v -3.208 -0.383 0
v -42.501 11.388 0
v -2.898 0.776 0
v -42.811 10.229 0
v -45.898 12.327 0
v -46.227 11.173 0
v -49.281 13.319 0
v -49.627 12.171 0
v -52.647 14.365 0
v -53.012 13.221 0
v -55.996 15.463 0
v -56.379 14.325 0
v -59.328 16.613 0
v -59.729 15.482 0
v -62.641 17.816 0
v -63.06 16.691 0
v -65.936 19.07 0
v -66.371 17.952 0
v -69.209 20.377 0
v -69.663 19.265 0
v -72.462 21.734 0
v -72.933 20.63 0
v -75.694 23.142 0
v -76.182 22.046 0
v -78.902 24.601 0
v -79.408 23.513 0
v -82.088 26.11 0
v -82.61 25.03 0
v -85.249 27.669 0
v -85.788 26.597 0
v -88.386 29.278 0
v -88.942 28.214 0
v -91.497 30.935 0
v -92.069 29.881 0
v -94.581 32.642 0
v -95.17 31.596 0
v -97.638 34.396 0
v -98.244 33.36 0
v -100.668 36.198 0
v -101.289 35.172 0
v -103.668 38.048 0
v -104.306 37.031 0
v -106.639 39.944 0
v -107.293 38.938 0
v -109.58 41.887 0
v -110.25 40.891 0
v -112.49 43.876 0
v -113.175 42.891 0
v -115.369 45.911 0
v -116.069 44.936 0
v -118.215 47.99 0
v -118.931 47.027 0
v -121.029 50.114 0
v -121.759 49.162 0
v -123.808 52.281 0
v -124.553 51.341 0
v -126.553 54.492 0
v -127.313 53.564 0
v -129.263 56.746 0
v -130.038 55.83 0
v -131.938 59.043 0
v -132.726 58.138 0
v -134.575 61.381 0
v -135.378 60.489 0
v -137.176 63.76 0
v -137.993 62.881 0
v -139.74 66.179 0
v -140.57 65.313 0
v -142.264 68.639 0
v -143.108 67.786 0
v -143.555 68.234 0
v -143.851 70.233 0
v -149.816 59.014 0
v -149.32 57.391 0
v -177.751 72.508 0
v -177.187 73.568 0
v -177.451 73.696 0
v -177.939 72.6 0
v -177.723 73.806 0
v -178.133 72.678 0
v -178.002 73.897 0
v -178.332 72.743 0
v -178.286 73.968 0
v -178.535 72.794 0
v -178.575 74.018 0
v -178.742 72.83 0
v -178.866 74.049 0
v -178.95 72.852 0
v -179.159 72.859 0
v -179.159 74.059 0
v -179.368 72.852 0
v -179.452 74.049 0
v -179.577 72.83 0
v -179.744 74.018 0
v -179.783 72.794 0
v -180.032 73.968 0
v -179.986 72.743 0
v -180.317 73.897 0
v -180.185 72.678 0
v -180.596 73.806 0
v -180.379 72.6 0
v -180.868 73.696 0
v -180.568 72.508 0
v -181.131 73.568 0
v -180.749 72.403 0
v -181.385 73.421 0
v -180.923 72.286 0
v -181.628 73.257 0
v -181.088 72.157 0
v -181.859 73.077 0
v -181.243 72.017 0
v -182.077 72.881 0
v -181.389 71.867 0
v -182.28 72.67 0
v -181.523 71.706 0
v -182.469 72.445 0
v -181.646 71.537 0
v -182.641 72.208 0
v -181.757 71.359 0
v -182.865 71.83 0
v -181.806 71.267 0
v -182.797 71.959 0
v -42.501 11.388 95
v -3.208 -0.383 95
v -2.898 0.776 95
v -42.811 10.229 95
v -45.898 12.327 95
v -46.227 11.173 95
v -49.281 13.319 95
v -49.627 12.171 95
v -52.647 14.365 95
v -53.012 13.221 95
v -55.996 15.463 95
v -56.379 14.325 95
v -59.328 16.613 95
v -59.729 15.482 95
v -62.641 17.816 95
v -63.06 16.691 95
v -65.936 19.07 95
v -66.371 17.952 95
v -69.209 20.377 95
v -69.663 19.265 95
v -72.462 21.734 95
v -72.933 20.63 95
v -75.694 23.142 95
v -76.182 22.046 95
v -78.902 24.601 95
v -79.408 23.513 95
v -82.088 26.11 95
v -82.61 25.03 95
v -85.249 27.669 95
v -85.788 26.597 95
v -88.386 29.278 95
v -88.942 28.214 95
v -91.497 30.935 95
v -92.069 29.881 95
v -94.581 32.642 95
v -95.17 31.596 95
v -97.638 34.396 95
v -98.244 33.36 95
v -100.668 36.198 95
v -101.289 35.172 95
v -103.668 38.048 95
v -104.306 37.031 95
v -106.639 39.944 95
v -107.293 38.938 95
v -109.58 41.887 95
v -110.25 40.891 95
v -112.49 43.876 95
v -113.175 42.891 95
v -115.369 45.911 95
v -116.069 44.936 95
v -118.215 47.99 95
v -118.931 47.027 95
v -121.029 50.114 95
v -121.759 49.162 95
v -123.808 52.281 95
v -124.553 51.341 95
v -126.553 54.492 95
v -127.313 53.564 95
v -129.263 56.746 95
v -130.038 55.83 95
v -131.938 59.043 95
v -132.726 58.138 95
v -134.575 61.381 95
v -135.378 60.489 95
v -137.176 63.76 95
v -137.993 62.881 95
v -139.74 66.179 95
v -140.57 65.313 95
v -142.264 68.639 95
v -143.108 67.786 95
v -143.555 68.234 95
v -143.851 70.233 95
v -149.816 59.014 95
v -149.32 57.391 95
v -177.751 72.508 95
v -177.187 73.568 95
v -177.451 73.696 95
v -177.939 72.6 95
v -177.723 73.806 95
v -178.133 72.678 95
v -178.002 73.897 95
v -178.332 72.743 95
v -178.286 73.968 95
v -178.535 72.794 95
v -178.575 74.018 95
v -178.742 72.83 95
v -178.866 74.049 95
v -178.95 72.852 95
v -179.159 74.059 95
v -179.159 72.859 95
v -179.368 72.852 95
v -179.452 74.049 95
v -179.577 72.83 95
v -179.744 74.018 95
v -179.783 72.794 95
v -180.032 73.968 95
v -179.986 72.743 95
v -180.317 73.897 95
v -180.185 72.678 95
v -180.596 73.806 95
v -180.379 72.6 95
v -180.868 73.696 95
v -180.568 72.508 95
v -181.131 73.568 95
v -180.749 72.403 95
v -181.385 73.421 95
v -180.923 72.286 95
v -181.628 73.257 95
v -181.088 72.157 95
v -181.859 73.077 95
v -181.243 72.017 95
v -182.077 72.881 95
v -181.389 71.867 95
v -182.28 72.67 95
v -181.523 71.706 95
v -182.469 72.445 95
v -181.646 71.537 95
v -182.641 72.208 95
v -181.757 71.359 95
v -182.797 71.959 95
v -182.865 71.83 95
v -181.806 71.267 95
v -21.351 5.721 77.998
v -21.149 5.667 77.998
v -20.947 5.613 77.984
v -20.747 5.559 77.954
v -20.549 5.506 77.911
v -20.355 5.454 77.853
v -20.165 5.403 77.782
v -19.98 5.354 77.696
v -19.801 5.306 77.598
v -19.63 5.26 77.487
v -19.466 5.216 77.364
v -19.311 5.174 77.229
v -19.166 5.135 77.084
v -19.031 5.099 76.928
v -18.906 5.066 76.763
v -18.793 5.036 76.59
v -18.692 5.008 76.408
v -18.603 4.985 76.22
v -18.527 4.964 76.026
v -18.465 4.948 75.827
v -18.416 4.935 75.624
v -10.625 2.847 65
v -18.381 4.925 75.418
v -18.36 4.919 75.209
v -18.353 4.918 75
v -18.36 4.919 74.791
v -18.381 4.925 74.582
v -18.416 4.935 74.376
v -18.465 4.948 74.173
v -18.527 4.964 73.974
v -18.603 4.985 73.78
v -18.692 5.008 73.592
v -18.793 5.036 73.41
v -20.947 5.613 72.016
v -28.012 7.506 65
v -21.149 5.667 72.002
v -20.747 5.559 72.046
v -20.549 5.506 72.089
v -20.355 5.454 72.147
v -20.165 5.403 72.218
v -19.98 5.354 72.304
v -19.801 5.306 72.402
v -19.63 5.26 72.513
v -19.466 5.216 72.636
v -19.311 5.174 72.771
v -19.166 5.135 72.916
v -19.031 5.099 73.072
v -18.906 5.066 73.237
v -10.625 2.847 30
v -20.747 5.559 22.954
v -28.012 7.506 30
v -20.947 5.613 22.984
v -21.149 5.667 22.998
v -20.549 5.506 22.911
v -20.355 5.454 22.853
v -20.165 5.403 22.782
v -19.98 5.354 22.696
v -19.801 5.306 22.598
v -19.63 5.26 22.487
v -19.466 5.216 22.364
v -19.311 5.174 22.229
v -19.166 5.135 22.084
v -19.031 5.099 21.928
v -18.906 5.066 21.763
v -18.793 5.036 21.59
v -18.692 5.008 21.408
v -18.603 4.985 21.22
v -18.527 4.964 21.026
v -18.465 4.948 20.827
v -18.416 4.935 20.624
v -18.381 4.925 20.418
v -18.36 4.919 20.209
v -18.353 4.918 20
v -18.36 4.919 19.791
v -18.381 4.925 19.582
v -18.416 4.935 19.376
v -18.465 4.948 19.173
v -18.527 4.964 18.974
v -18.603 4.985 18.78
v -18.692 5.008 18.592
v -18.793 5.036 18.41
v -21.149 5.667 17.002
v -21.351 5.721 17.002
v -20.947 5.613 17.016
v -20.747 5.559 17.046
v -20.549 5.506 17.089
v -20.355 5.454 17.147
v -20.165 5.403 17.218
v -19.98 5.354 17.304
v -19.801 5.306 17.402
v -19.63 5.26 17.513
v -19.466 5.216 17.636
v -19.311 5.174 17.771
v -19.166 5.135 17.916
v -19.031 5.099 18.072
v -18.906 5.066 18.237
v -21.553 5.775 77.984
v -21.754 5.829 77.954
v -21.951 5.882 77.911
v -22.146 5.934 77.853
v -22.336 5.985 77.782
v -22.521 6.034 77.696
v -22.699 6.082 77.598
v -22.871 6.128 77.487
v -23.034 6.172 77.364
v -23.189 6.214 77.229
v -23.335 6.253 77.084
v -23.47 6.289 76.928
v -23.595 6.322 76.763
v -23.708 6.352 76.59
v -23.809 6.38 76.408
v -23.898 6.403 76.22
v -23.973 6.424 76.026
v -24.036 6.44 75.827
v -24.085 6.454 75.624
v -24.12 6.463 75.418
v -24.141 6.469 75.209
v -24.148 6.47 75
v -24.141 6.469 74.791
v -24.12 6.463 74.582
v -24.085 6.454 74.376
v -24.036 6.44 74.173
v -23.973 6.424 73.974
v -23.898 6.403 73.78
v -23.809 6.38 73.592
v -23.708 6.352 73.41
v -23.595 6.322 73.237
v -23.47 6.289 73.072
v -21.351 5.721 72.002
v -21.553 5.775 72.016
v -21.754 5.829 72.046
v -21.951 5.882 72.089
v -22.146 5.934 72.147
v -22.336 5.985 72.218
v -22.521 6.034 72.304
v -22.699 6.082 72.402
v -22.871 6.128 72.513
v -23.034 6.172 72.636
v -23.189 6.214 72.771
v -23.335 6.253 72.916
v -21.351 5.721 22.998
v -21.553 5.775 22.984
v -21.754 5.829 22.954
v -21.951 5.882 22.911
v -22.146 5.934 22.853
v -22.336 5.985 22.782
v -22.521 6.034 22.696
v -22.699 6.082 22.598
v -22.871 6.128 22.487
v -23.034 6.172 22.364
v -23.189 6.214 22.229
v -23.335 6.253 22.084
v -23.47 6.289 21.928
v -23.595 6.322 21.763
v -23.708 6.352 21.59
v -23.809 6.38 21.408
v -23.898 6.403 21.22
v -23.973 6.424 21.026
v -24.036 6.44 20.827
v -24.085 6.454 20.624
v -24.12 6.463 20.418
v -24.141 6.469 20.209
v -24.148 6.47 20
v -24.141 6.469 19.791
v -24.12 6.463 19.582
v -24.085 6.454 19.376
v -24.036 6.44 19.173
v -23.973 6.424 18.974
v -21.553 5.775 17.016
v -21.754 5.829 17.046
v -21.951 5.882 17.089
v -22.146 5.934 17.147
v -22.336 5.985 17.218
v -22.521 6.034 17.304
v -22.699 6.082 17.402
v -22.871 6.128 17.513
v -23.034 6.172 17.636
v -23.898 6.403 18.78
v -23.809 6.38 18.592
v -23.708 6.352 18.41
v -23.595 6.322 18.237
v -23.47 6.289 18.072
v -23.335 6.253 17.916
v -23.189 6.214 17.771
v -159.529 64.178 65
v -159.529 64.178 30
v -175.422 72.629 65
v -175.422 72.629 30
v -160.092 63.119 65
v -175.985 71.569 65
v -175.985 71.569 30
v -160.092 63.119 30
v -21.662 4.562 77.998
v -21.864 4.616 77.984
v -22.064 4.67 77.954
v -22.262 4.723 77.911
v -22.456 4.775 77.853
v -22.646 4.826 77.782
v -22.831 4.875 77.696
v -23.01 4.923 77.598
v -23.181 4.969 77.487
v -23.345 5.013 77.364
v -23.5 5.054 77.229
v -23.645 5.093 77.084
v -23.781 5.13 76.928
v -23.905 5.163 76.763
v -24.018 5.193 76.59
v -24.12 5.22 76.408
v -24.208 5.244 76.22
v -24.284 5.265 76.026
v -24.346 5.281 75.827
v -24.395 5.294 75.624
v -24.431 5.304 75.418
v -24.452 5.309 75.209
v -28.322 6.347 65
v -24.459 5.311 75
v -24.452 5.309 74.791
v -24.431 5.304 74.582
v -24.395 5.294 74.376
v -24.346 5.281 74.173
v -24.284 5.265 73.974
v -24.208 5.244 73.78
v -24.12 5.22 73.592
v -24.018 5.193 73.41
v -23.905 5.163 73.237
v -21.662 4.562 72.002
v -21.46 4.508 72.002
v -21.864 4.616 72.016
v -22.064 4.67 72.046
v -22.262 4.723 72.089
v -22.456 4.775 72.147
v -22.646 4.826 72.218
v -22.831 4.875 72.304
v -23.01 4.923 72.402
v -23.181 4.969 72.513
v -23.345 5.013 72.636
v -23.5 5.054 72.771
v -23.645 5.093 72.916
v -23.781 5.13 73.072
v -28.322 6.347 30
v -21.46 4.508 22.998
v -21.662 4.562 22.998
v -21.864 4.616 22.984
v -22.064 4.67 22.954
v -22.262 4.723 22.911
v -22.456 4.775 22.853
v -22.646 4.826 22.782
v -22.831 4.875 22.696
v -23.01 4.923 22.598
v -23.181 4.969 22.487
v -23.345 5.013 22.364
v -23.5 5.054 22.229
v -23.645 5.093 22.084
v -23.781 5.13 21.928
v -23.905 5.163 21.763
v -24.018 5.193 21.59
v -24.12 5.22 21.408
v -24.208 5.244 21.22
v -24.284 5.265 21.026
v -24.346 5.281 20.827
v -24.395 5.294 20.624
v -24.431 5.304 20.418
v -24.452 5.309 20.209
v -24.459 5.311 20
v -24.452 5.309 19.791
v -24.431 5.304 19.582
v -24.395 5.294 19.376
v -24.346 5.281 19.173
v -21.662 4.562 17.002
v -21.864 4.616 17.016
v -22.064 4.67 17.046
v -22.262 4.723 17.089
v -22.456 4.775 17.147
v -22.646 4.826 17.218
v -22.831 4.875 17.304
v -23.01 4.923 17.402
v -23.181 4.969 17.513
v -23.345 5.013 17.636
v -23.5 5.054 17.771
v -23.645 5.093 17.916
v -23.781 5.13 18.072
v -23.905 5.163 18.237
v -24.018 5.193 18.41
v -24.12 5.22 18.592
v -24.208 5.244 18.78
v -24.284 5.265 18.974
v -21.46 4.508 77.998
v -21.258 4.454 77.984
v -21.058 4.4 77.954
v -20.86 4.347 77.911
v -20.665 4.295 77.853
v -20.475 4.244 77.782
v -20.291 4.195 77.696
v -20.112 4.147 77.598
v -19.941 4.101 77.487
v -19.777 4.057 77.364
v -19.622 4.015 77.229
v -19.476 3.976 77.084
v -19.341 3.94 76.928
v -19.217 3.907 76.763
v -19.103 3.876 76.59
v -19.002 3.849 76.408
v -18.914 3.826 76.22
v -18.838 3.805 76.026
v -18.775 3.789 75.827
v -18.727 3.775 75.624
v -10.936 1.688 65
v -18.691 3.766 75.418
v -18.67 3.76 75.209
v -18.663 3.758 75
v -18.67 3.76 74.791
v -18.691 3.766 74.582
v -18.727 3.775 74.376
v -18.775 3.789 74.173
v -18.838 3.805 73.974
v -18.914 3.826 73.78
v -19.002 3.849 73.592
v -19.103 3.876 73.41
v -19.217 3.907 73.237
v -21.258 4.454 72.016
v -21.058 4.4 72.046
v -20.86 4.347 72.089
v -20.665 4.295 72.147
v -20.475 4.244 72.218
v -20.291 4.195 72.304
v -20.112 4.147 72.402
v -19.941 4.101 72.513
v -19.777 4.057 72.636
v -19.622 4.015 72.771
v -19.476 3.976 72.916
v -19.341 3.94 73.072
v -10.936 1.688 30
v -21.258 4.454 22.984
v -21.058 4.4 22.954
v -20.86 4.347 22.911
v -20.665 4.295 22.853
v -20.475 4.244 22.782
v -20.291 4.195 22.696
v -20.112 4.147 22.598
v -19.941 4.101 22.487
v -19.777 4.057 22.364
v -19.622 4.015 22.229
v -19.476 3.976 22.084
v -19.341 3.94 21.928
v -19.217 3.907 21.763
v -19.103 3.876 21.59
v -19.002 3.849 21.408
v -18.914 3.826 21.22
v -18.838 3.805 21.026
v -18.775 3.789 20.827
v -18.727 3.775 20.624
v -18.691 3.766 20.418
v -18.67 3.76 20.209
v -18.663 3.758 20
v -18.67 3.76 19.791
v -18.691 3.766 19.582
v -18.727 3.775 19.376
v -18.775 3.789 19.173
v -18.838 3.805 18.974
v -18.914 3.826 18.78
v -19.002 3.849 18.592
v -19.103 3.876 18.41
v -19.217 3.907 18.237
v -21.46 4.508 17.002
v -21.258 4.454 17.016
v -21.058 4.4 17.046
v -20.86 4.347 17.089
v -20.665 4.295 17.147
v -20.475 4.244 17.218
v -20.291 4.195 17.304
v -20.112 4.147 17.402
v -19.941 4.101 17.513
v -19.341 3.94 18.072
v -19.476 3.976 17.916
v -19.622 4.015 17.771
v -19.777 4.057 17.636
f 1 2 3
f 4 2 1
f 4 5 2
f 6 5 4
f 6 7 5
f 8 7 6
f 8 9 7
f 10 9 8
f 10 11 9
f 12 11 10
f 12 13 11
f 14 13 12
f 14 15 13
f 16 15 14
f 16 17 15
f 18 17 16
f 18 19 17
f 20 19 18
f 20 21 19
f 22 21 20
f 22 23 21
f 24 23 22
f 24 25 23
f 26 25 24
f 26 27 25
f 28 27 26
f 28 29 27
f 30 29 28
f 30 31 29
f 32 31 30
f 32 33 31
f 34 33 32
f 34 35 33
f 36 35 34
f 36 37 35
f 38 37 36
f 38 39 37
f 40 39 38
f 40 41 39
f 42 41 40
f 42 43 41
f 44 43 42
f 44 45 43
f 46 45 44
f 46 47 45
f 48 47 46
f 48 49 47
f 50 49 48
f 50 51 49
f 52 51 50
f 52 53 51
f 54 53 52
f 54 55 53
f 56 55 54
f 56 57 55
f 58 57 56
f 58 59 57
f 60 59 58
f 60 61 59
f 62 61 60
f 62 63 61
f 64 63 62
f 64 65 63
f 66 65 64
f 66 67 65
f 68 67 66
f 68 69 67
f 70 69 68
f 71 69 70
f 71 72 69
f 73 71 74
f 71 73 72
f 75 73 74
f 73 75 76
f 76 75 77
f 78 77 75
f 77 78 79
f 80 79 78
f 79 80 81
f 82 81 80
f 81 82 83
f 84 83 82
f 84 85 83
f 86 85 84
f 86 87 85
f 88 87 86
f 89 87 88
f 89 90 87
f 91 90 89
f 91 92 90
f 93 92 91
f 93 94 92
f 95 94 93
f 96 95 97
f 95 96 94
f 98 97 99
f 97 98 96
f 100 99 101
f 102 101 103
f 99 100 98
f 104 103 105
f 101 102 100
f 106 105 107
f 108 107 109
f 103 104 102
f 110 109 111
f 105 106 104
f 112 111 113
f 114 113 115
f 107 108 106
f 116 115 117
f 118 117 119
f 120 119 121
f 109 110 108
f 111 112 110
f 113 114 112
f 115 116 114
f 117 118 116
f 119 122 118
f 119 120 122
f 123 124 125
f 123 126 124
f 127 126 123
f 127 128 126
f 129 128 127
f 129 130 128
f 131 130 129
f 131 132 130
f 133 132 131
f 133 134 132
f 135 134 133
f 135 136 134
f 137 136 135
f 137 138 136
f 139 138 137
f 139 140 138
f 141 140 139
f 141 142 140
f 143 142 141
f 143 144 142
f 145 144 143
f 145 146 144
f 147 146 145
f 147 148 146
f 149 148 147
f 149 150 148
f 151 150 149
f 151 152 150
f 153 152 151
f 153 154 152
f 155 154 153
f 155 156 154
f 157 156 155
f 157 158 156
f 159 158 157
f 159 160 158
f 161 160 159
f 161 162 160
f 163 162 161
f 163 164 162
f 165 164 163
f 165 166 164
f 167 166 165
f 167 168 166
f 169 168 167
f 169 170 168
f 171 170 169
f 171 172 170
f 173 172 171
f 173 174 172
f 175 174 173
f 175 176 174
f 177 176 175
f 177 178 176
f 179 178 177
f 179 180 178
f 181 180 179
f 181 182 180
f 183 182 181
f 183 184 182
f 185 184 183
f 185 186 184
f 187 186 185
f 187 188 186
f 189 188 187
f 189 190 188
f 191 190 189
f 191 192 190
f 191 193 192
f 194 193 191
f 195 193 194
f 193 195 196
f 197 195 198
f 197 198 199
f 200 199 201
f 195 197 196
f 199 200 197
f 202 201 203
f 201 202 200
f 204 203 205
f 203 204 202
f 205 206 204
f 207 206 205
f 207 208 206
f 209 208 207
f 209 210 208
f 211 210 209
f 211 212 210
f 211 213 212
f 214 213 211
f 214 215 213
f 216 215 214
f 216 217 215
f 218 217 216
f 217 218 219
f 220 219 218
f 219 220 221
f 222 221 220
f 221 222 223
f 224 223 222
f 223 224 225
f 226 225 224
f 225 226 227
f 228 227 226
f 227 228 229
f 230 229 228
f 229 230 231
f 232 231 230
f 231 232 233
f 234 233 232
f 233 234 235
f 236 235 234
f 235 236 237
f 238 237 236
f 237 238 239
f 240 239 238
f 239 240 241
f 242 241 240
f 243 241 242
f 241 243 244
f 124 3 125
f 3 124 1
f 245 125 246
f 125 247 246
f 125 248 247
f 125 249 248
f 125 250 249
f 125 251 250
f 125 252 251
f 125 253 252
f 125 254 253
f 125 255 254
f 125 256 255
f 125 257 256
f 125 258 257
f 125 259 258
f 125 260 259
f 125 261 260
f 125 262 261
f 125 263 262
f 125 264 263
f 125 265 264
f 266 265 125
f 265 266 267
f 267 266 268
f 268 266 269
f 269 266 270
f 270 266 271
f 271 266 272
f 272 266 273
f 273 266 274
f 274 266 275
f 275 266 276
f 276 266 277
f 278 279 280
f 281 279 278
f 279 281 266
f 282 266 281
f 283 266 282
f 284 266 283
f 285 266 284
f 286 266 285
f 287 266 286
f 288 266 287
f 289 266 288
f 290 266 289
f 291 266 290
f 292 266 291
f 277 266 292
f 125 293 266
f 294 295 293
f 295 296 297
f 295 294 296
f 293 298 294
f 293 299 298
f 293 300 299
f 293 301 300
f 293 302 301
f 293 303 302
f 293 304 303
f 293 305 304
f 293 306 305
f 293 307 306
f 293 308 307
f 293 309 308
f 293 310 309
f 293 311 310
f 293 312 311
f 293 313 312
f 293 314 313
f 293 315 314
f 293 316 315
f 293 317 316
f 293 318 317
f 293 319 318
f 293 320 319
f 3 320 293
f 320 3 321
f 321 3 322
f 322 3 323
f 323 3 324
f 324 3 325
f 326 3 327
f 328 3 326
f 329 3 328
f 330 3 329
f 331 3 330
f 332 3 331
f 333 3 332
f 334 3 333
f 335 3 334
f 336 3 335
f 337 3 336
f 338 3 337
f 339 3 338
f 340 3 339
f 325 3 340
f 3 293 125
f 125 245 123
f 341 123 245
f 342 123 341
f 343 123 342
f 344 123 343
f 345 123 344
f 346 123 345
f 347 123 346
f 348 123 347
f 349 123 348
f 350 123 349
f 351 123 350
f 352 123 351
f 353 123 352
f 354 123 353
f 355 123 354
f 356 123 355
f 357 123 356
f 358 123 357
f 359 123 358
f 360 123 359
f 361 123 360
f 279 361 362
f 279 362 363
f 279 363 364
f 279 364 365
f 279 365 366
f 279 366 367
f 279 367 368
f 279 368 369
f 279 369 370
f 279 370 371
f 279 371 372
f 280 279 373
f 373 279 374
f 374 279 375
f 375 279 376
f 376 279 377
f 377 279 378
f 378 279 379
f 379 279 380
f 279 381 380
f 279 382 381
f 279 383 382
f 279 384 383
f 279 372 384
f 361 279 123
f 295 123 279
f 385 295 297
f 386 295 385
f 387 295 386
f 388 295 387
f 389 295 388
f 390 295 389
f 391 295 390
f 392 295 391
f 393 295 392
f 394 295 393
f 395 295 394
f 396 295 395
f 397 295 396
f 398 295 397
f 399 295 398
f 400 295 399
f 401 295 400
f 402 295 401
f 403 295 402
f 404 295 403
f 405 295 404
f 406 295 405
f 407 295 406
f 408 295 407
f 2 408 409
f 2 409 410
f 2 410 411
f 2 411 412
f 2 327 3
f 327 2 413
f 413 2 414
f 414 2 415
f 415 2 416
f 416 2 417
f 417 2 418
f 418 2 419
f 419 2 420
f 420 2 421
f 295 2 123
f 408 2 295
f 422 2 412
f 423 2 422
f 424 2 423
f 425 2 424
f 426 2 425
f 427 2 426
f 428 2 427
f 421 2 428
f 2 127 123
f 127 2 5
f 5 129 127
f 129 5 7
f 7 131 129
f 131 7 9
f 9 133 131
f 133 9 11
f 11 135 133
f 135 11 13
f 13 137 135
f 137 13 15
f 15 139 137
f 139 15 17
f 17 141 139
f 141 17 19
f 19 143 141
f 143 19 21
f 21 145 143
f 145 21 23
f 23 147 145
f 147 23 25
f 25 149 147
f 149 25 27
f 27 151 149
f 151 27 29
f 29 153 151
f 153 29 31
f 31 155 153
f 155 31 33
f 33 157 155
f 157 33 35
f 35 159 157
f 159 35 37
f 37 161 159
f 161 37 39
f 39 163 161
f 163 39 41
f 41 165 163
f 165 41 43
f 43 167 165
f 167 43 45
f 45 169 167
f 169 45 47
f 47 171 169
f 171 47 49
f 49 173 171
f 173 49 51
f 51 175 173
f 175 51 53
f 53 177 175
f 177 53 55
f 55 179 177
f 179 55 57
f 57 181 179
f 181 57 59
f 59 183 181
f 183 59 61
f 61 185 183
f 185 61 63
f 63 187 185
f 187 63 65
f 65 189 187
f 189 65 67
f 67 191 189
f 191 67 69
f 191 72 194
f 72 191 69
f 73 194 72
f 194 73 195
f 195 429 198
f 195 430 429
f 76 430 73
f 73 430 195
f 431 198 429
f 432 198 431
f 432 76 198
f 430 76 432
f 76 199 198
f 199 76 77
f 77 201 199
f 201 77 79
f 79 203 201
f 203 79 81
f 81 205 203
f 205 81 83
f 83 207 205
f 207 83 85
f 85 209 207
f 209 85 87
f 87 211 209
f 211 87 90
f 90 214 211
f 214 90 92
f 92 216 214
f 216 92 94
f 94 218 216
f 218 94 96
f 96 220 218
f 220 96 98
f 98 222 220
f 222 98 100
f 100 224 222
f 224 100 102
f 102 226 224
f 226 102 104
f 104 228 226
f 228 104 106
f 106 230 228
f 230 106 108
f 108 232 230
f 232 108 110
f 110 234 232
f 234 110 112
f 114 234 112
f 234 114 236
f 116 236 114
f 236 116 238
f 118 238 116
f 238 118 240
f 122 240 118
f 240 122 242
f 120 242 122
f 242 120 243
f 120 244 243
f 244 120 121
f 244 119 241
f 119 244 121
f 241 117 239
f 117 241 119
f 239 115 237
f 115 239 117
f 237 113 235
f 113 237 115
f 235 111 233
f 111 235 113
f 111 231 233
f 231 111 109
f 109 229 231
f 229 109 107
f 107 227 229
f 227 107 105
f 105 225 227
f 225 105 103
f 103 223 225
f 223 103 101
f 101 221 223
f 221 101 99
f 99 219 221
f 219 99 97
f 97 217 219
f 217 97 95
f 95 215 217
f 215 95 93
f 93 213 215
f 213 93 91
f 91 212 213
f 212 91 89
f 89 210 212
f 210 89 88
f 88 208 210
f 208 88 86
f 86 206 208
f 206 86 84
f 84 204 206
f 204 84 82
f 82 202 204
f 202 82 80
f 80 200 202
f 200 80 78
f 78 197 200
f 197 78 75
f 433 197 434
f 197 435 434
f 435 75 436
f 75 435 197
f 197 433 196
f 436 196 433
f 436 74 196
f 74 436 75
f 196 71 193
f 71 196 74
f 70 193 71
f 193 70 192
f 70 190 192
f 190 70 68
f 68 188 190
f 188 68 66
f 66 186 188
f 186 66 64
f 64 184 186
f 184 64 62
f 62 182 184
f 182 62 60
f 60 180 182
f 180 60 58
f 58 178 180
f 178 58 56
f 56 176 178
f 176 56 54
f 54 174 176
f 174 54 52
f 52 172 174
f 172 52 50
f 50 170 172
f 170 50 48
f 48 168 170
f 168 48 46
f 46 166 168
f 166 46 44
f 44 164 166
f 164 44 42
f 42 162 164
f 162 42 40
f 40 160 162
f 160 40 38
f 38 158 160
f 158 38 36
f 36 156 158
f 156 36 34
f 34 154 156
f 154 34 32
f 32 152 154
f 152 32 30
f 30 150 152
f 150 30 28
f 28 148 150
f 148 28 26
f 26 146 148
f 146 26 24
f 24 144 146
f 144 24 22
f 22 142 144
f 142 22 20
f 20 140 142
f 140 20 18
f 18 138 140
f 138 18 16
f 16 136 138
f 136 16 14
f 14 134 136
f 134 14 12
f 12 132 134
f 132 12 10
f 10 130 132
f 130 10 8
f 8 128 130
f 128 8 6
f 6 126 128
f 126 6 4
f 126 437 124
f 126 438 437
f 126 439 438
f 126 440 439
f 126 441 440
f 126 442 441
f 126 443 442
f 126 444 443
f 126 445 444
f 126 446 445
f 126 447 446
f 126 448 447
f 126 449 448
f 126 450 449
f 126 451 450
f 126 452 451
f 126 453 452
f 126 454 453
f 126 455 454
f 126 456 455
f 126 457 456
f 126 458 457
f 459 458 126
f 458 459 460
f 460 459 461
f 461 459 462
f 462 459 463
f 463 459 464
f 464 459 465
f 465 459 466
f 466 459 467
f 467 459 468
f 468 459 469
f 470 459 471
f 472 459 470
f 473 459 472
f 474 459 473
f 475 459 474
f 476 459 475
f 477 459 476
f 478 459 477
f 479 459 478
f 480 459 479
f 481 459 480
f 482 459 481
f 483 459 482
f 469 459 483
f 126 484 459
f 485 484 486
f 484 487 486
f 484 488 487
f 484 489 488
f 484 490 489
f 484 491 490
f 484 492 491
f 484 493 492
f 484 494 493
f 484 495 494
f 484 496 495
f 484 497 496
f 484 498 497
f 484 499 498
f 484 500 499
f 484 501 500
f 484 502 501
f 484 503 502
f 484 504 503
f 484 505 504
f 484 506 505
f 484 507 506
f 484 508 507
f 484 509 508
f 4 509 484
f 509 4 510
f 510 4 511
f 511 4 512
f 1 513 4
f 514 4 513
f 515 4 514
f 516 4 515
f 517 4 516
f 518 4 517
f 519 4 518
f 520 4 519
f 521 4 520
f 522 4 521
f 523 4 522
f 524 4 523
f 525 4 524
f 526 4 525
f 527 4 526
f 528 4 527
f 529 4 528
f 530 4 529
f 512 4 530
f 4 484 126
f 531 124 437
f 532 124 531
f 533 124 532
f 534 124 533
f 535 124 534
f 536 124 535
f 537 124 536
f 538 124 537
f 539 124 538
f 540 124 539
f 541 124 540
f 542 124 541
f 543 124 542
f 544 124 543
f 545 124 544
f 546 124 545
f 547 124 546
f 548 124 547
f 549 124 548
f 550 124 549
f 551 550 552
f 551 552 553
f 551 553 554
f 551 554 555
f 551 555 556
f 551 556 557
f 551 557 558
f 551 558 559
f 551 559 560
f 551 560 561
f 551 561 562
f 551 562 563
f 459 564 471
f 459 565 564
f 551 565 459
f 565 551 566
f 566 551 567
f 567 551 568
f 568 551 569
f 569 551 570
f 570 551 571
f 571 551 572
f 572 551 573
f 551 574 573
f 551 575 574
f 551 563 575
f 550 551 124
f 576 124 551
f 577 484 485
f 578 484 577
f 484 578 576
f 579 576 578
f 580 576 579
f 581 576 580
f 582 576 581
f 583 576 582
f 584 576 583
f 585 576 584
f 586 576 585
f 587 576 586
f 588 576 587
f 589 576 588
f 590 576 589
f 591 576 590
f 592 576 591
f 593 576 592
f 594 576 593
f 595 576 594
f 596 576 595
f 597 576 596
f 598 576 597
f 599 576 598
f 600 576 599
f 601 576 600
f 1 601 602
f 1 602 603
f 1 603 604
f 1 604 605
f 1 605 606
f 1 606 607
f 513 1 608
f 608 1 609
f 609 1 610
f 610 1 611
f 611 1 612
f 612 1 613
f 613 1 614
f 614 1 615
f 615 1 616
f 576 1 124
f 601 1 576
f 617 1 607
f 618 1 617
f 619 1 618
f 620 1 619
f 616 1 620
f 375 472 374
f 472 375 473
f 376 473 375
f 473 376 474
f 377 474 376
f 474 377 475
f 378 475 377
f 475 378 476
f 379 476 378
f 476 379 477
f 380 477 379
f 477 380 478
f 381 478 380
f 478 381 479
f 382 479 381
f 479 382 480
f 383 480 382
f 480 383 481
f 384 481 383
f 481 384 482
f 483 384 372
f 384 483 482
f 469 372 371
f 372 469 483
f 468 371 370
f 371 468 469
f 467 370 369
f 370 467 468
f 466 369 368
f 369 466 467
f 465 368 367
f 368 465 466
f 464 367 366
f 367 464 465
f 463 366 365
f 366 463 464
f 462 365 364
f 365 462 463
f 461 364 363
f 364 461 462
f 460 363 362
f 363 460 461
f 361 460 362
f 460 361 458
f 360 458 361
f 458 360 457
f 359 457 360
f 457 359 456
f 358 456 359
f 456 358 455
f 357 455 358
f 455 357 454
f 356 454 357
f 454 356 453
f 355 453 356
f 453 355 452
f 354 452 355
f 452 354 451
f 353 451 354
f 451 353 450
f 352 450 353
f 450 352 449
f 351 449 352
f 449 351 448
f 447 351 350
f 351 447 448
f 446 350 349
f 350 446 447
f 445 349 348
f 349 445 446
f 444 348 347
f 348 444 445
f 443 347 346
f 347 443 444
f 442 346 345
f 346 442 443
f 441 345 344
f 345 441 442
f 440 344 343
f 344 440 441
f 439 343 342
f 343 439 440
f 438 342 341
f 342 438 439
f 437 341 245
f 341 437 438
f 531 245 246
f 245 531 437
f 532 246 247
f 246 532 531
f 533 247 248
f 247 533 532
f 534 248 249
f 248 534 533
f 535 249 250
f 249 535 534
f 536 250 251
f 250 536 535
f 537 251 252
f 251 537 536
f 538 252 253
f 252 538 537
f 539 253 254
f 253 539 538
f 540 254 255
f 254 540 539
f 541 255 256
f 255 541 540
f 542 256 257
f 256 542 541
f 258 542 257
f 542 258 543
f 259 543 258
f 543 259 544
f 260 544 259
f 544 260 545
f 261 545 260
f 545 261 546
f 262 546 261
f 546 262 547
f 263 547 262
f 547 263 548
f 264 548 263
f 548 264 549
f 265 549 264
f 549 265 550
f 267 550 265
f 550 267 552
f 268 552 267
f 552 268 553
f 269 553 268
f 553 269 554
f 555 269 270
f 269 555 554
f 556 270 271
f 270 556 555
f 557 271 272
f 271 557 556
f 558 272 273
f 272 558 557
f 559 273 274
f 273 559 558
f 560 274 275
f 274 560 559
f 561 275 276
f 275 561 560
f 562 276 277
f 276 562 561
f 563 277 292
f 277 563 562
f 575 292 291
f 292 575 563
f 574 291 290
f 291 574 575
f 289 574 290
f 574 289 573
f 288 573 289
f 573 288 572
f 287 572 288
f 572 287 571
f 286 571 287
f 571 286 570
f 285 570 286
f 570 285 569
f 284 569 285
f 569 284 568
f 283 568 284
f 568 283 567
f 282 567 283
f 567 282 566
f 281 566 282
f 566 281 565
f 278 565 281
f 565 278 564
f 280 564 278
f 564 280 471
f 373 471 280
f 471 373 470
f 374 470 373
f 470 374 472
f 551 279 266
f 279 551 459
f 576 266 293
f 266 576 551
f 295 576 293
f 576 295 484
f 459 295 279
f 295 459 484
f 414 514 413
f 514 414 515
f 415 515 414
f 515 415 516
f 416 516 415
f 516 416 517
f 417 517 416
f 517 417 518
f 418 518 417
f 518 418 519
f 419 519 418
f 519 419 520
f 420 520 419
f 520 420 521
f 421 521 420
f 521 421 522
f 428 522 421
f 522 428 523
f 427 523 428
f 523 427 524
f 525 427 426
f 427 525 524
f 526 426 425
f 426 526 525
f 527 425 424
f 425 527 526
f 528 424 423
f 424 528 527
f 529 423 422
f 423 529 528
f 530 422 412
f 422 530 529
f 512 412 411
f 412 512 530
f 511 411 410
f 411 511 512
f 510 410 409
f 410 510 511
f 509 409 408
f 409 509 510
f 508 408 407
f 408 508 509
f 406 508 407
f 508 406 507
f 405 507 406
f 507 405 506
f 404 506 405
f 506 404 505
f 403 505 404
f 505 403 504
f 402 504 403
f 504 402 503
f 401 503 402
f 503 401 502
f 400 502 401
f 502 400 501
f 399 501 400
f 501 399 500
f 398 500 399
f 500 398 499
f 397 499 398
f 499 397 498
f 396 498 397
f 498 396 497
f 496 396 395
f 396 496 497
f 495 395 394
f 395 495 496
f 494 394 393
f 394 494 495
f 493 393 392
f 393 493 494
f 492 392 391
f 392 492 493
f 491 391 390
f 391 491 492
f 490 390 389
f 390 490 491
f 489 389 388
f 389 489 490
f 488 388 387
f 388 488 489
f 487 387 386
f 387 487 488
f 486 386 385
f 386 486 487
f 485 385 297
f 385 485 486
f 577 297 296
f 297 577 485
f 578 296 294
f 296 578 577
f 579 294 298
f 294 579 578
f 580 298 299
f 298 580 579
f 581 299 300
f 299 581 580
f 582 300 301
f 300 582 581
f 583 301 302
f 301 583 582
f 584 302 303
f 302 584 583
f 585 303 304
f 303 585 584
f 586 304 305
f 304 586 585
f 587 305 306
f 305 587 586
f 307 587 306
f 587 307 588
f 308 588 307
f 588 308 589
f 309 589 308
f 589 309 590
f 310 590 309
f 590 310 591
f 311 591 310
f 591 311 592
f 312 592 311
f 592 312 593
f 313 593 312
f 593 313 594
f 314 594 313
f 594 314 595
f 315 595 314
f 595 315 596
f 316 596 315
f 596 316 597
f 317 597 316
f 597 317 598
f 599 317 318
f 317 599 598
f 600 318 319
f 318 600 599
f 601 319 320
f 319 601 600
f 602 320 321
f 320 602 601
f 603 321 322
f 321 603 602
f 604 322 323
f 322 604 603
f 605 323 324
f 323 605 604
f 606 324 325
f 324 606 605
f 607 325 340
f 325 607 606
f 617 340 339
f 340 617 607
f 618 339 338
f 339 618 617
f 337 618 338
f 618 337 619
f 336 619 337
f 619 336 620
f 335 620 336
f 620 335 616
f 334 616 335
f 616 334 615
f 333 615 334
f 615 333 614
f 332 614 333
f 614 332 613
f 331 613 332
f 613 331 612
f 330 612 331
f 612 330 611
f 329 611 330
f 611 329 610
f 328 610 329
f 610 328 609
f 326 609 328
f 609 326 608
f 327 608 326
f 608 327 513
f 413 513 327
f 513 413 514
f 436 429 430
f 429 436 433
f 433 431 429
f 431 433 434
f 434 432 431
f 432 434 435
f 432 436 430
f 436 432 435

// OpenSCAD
// file: ../src/door_catch.scad
in=25.4;

// how thick is the door?
door_thick=44;


// how wide the door is; makes for cleaner angles
door_width=28*in;

// how far should the door be open?
// distance of gap will be echo'd
//open_angle=(sin($t*360)/2+0.5)*45;
open_angle=13;

// distance to edge, used to place hole
catch=15;

// size of catch hole
catch_x=18;
catch_y=35;

// size of screw holes
screw=6;

// space between screws
// screws are assumed to be centered in door_thick
screw_gap=55;

// space around screw holes if automatically calculating height
screw_wall=4;

// thickness of part
wall=1.2;

//height=screw_gap+screw+screw_wall*2;
height=70;

// size of Z shape that stops the door from closing
latch=in/2;

// extra curve at end of the part to make closing smoother
close_r=3;

// trim off ends to fit printer bed 
//trim_base=14;
trim_base=3;
trim_end=10;

// only used for drawing a preview door
door_h=height;
display_angle=open_angle;


$fn=90;

big_fn=400;

function segment_radius(height, chord) = (height/2)+(chord*chord)/(8*height);

// link to sketch
open_y=sin(open_angle)*door_width;
open_x=door_width-(cos(open_angle)*door_width);
opening=sqrt((pow(open_x,2)+pow((open_y-door_thick),2)));
echo(opening/in);
echo(opening);

// link to sketch
latch_x=door_width-(cos(open_angle)*(door_width-latch));
latch_y=(sin(open_angle)*(door_width-latch))-door_thick;
latch_hyp=sqrt(pow(latch_x,2)+pow(latch_y,2));
latch_angle=atan(latch_y/latch_x);
radius=segment_radius(latch_x,latch_y*2);

module door() {
    translate([door_width,0])
    mirror([1,0,0])
    rotate([0,0,display_angle])
    color("tan")
    cube([door_width,door_thick,door_h]);
}

module profile() {
    translate([-wall,trim_base])
    square([wall,door_thick-trim_base]);
    translate([radius,door_thick])
    difference() {
        circle(r=radius+wall,$fn=big_fn);
        circle(r=radius,$fn=big_fn);

        // cut off botttom 
        translate([-radius-wall,-radius-wall*2])
        square([radius*2+wall*2,radius+wall*2]);

        // top right
        square([radius+wall*2,radius+wall*2]);

        // door
        translate([door_width-radius,-door_thick])
        mirror([1,0,0])
        rotate([0,0,display_angle])
        square([door_width,radius]);
    }
    translate([door_width,0])
    rotate([0,0,-open_angle]) 
    translate([-door_width,0]) {
        translate([-wall,-wall])
        square([latch,wall]);
        translate([-wall,-wall])
        square([wall,door_thick+wall-close_r-trim_end]);
        translate([-wall-close_r,door_thick-close_r-trim_end])
        difference() {
            intersection() {
                circle(r=close_r+wall);
                square([close_r+wall,close_r+wall]);
            }
            circle(r=close_r);
        }
    }
}

module dirror_y() {
    children();
    mirror([0,1])
    children();
}

module catch() {
    translate([door_thick/2-catch_x/2-catch,0])
    square([catch_x,catch_y],center=true);
    children();
}

module screws() {
    dirror_y()
    translate([0,screw_gap/2])
    circle(d=screw);
}

module place_catch(angle=0) {
    translate([door_width,0])
    rotate([0,0,-angle])
    translate([-door_width-wall*2,door_thick/2,height/2])
    rotate([90,0,90])
    linear_extrude(height=wall*3)
    children();
}

module latch() {
    difference() {
        linear_extrude(height=height)
        profile();
        place_catch()
        // uncomment this to allow the door to close
        catch()
        screws();
        place_catch(open_angle)
        catch();
    }
}
// main file
include <../src/door_catch.scad>;

height=(sin($t*360)/2+0.5)*70+60;

// RENDER gif
module demo() {
    rotate([0,0,75])
    latch();
}

demo();
